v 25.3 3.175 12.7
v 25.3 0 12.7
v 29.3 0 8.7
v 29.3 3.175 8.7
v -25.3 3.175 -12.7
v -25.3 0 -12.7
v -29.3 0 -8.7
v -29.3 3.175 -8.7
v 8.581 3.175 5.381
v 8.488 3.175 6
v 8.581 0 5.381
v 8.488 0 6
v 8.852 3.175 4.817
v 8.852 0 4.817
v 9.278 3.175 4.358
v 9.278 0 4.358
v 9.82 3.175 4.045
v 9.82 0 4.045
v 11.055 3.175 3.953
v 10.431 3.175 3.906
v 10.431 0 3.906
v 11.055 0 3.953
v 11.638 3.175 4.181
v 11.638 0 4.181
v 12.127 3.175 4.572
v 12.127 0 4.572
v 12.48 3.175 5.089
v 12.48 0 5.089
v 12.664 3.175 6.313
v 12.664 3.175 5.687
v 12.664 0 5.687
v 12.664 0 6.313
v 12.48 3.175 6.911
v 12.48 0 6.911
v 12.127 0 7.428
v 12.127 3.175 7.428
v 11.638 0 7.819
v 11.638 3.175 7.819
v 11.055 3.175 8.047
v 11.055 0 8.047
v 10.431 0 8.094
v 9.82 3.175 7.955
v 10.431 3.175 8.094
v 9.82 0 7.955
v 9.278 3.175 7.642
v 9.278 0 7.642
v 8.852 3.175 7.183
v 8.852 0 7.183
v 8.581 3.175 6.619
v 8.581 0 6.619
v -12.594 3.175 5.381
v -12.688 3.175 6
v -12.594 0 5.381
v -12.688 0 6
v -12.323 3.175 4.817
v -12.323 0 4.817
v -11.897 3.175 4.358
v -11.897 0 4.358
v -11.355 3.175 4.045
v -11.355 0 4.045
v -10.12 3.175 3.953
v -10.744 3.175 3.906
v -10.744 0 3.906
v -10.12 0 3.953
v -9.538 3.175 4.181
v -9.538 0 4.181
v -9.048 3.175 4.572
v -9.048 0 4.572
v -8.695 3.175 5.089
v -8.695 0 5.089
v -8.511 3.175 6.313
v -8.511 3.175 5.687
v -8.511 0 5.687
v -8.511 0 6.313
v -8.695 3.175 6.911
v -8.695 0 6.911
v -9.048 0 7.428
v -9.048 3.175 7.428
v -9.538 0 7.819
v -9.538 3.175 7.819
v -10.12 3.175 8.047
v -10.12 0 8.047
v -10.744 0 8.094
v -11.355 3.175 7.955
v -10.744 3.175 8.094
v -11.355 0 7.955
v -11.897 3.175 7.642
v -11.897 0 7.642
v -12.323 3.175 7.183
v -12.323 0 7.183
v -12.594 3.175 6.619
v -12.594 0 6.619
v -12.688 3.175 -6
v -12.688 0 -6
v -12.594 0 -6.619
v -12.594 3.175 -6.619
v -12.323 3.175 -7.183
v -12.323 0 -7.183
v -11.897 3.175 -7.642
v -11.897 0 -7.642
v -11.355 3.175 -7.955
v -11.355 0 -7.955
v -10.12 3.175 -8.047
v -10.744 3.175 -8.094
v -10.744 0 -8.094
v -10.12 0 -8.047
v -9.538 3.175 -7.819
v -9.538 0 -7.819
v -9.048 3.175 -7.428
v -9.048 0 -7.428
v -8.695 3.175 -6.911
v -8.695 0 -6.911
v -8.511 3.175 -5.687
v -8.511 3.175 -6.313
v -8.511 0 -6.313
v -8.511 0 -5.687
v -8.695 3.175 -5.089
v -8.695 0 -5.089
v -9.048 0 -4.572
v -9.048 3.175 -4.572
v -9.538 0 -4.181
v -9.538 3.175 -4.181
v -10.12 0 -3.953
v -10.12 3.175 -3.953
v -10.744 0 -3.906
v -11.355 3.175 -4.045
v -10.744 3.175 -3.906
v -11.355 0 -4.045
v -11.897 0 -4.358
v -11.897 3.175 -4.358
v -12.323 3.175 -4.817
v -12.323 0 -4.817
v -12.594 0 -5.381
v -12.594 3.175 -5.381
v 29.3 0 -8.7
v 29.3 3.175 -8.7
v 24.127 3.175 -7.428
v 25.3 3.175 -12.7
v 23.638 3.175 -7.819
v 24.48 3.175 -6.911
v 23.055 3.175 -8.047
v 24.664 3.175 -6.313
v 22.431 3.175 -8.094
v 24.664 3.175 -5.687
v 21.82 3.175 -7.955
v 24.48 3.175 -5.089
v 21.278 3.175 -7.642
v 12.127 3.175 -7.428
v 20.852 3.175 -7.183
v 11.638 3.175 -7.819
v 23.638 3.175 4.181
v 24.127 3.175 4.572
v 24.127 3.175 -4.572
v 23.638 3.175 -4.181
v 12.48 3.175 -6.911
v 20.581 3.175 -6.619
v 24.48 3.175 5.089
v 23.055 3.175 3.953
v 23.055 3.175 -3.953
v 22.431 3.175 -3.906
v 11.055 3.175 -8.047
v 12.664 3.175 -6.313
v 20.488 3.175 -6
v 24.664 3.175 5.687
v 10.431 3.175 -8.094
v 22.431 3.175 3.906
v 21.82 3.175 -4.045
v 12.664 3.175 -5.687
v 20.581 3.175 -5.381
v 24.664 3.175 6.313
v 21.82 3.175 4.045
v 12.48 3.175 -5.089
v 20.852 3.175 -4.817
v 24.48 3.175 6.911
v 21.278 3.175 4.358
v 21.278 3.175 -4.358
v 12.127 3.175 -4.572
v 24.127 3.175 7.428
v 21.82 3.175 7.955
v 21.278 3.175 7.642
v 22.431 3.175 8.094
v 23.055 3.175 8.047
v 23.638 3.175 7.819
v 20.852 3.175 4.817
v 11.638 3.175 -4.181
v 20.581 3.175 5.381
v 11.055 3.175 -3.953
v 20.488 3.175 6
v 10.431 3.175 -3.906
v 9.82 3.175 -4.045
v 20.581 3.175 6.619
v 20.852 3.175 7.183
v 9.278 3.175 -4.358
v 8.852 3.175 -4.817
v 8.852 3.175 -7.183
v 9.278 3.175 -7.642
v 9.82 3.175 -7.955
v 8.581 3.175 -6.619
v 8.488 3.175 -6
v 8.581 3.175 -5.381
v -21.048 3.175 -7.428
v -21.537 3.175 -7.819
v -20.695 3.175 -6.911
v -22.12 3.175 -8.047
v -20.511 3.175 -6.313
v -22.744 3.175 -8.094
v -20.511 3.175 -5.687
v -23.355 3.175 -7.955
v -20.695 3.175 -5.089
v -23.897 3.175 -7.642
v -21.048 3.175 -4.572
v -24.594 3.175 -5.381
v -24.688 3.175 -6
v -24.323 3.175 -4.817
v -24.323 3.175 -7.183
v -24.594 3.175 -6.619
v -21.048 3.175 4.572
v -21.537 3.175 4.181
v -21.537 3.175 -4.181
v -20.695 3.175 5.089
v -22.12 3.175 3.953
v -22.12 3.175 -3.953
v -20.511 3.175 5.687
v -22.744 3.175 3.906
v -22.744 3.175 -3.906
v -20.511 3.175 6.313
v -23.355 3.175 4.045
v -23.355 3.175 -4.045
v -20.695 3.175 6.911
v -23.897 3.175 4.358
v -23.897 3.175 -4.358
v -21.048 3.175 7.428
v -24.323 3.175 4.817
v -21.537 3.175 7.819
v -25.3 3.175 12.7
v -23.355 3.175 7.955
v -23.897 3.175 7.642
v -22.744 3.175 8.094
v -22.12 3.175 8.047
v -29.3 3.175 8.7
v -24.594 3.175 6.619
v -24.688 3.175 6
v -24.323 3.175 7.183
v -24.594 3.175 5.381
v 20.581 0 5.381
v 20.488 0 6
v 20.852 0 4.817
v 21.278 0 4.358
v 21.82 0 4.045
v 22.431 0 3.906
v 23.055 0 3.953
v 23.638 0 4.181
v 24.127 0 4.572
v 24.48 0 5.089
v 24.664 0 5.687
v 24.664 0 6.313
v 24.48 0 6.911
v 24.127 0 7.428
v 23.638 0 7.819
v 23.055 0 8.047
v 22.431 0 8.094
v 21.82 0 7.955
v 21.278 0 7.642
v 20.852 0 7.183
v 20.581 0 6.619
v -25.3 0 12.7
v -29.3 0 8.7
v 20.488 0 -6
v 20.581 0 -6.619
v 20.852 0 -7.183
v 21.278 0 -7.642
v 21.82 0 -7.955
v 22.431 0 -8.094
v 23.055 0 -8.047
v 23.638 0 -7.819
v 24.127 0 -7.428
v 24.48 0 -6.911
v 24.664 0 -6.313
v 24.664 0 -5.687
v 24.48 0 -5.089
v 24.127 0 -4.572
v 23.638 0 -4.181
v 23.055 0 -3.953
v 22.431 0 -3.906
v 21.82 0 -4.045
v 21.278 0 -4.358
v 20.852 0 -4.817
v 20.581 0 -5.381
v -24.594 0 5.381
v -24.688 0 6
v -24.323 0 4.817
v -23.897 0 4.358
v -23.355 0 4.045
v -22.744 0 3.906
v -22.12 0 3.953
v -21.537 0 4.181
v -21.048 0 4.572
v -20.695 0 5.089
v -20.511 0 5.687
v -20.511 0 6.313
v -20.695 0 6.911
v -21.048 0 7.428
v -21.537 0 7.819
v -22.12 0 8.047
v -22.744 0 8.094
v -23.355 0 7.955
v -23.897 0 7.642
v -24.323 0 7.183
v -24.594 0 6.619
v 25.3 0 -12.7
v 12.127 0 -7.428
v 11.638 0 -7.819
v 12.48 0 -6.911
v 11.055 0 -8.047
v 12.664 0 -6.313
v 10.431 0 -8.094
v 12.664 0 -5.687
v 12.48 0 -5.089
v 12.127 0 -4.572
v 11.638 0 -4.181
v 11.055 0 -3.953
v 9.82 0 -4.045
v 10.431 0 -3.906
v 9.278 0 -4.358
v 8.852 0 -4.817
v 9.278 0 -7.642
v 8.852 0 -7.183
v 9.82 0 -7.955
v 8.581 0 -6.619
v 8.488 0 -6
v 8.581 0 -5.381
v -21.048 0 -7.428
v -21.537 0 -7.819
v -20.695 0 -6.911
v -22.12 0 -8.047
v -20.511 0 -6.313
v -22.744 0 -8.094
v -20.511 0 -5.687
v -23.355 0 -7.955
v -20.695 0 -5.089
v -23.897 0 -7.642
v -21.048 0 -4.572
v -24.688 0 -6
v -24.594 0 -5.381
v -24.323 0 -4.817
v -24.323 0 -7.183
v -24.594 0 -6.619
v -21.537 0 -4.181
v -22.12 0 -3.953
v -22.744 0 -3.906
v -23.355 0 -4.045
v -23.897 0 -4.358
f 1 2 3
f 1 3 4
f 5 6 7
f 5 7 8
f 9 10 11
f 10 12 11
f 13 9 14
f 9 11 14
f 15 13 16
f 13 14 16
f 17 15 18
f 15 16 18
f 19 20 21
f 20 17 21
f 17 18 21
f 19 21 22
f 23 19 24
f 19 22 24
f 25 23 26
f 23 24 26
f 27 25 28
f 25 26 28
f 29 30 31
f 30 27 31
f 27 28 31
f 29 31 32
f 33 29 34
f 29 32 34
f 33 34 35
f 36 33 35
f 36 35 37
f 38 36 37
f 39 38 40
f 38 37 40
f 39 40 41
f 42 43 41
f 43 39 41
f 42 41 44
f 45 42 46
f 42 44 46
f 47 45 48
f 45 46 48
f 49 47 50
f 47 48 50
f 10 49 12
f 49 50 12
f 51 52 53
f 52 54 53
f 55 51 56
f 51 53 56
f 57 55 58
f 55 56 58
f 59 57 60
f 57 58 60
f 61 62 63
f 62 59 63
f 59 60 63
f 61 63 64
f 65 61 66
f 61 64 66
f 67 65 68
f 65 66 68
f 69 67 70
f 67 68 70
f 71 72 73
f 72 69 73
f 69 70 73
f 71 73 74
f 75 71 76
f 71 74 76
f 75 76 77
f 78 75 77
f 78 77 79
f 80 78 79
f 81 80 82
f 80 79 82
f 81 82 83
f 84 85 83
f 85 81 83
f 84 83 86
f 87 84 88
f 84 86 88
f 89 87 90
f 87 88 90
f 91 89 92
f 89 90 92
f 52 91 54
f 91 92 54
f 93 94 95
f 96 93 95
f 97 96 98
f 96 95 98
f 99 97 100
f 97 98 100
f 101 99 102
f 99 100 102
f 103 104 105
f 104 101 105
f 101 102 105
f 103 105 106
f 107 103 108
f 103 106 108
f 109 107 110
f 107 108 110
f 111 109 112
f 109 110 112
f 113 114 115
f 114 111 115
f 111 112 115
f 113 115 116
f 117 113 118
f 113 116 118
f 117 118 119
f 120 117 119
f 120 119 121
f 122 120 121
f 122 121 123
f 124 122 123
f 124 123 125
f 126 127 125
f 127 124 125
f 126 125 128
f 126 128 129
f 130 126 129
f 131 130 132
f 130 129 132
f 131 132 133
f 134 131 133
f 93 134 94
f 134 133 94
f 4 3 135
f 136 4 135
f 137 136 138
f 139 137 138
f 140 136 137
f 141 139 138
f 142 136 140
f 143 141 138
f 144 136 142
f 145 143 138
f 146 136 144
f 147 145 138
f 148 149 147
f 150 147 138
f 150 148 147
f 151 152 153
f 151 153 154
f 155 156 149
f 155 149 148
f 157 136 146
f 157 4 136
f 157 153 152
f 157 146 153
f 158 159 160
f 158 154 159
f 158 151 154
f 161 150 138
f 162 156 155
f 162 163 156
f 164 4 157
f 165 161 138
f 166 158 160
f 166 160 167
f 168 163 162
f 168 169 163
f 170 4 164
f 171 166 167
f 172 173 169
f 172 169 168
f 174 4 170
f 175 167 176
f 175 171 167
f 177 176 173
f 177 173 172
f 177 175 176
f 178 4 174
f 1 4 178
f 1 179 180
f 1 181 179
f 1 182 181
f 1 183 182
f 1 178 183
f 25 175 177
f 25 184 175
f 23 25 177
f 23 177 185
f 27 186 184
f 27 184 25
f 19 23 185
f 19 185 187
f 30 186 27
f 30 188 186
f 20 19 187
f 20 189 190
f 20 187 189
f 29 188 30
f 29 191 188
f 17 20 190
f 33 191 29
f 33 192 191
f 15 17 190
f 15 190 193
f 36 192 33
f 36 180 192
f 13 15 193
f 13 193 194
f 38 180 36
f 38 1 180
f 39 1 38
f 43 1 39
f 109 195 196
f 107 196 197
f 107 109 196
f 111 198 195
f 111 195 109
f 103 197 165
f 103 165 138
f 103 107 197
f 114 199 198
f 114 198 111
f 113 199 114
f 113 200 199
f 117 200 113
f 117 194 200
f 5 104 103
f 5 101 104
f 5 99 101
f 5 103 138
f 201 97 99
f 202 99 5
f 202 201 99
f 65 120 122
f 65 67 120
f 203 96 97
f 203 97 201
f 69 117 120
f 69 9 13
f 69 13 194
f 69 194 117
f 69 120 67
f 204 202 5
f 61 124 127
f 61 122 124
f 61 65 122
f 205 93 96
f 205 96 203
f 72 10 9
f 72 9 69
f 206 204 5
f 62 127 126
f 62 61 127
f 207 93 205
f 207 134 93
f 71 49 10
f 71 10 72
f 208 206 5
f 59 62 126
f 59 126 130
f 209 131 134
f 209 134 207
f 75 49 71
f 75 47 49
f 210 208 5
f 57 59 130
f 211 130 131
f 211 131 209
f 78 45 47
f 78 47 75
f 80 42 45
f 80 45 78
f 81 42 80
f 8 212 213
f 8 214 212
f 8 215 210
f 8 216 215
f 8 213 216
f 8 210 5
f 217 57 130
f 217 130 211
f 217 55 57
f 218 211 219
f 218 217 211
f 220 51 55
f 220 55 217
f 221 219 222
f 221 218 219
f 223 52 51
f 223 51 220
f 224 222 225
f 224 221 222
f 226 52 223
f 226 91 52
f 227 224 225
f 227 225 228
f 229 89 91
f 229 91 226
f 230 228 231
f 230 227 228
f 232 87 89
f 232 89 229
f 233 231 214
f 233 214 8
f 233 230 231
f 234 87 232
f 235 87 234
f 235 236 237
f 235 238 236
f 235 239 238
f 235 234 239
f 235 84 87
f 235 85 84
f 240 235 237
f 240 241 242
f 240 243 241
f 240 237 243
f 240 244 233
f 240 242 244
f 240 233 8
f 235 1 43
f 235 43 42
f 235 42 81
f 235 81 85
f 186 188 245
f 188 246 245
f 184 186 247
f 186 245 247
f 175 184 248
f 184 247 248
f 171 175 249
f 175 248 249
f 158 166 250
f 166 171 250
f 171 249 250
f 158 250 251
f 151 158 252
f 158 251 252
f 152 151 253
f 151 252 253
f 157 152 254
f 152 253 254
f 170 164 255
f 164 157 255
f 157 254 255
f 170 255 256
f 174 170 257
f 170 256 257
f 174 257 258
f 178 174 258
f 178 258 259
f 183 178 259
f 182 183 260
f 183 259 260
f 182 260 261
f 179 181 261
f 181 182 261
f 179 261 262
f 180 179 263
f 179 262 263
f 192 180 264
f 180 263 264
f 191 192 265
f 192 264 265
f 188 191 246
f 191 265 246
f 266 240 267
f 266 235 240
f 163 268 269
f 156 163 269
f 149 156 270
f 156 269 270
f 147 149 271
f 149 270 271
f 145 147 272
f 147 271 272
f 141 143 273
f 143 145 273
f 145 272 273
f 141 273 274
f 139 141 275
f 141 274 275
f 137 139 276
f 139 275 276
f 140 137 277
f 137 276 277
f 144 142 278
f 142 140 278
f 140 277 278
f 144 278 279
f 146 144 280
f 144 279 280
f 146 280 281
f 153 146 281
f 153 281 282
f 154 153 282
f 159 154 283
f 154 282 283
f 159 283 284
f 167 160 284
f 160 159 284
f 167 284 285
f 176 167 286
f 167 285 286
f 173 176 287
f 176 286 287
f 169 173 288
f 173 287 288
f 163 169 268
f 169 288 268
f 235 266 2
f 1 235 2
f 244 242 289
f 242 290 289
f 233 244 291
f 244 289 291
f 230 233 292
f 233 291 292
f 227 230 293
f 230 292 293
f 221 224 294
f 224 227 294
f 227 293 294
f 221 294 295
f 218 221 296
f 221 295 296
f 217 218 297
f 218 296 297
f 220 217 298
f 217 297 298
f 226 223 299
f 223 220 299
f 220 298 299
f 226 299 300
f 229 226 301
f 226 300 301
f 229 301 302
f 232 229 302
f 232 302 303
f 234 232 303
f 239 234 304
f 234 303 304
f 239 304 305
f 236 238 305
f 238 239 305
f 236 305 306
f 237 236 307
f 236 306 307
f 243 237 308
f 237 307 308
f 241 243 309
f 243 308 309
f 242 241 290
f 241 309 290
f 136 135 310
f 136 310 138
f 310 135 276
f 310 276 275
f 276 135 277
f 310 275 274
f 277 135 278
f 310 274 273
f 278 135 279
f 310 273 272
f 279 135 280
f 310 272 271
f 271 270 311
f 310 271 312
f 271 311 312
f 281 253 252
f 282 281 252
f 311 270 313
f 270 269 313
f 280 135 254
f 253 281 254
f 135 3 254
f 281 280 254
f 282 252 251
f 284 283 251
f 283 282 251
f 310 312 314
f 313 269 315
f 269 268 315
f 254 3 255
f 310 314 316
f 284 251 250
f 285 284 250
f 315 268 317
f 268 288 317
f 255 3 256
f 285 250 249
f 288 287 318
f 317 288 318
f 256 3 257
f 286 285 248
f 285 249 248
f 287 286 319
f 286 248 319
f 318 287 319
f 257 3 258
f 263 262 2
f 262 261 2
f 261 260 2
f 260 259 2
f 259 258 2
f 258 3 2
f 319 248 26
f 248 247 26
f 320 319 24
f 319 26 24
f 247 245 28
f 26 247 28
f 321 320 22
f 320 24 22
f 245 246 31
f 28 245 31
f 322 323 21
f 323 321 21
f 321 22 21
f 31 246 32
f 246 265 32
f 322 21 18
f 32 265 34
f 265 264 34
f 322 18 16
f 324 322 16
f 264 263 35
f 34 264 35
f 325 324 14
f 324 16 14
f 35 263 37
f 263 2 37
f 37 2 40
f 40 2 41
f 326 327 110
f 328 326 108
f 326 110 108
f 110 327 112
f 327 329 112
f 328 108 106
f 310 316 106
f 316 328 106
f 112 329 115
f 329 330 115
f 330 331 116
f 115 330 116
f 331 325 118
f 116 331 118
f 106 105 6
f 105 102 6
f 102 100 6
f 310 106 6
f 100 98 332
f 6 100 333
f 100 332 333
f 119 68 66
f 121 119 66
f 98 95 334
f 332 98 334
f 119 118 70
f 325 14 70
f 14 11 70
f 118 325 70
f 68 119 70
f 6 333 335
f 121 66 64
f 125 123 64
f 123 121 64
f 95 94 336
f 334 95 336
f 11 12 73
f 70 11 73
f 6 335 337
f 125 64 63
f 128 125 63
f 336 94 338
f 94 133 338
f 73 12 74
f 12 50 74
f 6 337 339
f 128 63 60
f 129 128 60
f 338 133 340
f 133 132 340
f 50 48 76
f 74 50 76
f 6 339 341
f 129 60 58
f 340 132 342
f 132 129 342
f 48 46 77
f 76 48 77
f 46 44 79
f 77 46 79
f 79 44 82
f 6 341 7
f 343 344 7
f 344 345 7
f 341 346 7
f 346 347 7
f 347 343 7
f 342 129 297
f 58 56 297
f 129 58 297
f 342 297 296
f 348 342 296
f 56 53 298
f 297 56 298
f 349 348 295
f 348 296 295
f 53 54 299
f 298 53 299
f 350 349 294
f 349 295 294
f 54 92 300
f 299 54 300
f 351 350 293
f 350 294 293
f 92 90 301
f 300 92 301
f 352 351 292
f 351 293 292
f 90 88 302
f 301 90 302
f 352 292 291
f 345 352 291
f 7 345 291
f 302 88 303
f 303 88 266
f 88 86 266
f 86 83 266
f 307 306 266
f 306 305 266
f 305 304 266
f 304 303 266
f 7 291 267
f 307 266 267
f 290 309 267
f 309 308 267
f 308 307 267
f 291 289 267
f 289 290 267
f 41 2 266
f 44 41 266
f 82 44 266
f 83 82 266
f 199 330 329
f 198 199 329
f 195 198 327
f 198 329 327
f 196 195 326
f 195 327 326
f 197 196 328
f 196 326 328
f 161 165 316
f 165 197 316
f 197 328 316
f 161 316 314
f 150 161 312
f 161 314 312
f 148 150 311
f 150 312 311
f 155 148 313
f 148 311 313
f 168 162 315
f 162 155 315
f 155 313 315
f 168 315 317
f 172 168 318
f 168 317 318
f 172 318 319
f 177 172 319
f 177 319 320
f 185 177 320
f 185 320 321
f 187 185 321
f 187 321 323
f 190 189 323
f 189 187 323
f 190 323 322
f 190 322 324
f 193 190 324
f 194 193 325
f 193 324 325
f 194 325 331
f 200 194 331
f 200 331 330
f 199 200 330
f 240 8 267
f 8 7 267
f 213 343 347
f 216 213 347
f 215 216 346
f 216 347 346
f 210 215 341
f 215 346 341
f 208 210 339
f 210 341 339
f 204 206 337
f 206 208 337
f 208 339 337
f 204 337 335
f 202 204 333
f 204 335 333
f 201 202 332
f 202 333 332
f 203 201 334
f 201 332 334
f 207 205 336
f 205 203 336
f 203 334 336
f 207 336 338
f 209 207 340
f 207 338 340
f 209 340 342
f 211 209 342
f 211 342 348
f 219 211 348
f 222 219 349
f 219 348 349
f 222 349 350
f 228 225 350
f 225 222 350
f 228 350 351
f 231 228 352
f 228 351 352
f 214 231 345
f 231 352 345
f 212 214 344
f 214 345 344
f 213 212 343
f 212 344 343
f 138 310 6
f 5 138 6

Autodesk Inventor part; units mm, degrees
ref_plane "YZ Plane" through (0, 0, 0) normal (1, 0, 0) x (0, 1, 0)
ref_plane "XZ Plane" through (0, 0, 0) normal (0, 1, 0) x (-1, 0, 0)
ref_plane "XY Plane" through (0, 0, 0) normal (0, 0, 1) x (1, 0, 0)
sketch "Sketch1" plane through (0, 0, 0) normal (0, 1, 0) x (-1, 0, 0)
  circle A0 centre (16.5875, 0) radius 2.5 construction
  circle A1 centre (-16.5875, 0) radius 2.5 construction
  line L0 (16.5875, 0) -> (-16.5875, 0) construction
  circle A2 centre (10.5875, 6) radius 2.1
  circle A3 centre (10.5875, -6) radius 2.1
  circle A4 centre (22.5875, -6) radius 2.1
  circle A5 centre (22.5875, 6) radius 2.1
  circle A6 centre (-22.5875, -6) radius 2.1
  circle A7 centre (-10.5875, -6) radius 2.1
  circle A8 centre (-10.5875, 6) radius 2.1
  circle A9 centre (-22.5875, 6) radius 2.1
  line L1 (29.3, 12.7) -> (-29.3, 12.7)
  line L2 (-29.3, 12.7) -> (-29.3, -12.7)
  line L3 (-29.3, -12.7) -> (29.3, -12.7)
  line L4 (29.3, -12.7) -> (29.3, 12.7)
  line L5 (29.3, 12.7) -> (-29.3, -12.7) construction
  line L6 (-29.3, 12.7) -> (29.3, -12.7) construction
  point P0 (0, 0)
  point P1 (0, 0)
  dimension "d0" = 5
  dimension "d1" = 5
  dimension "d2" = 33.175
  dimension "d3" = 4.2
  dimension "d4" = 6
  dimension "d5" = 6
  dimension "d8" = 360
  dimension "d10" = 4.2
  dimension "d11" = 6
  dimension "d12" = 6
  dimension "d15" = 360
  dimension "d17" = 58.6
  dimension "d18" = 25.4
extrude "Extrusion1" add sketch "Sketch1" along normal blind 3.175
chamfer "Chamfer1" distance 4 angle 45 4 edges at (-29.3, 1.5875, 12.7) (29.3, 1.5875, 12.7) (29.3, 1.5875, -12.7) (-29.3, 1.5875, -12.7)
properties part number "MotorMoutningTopConnectionPlate"
